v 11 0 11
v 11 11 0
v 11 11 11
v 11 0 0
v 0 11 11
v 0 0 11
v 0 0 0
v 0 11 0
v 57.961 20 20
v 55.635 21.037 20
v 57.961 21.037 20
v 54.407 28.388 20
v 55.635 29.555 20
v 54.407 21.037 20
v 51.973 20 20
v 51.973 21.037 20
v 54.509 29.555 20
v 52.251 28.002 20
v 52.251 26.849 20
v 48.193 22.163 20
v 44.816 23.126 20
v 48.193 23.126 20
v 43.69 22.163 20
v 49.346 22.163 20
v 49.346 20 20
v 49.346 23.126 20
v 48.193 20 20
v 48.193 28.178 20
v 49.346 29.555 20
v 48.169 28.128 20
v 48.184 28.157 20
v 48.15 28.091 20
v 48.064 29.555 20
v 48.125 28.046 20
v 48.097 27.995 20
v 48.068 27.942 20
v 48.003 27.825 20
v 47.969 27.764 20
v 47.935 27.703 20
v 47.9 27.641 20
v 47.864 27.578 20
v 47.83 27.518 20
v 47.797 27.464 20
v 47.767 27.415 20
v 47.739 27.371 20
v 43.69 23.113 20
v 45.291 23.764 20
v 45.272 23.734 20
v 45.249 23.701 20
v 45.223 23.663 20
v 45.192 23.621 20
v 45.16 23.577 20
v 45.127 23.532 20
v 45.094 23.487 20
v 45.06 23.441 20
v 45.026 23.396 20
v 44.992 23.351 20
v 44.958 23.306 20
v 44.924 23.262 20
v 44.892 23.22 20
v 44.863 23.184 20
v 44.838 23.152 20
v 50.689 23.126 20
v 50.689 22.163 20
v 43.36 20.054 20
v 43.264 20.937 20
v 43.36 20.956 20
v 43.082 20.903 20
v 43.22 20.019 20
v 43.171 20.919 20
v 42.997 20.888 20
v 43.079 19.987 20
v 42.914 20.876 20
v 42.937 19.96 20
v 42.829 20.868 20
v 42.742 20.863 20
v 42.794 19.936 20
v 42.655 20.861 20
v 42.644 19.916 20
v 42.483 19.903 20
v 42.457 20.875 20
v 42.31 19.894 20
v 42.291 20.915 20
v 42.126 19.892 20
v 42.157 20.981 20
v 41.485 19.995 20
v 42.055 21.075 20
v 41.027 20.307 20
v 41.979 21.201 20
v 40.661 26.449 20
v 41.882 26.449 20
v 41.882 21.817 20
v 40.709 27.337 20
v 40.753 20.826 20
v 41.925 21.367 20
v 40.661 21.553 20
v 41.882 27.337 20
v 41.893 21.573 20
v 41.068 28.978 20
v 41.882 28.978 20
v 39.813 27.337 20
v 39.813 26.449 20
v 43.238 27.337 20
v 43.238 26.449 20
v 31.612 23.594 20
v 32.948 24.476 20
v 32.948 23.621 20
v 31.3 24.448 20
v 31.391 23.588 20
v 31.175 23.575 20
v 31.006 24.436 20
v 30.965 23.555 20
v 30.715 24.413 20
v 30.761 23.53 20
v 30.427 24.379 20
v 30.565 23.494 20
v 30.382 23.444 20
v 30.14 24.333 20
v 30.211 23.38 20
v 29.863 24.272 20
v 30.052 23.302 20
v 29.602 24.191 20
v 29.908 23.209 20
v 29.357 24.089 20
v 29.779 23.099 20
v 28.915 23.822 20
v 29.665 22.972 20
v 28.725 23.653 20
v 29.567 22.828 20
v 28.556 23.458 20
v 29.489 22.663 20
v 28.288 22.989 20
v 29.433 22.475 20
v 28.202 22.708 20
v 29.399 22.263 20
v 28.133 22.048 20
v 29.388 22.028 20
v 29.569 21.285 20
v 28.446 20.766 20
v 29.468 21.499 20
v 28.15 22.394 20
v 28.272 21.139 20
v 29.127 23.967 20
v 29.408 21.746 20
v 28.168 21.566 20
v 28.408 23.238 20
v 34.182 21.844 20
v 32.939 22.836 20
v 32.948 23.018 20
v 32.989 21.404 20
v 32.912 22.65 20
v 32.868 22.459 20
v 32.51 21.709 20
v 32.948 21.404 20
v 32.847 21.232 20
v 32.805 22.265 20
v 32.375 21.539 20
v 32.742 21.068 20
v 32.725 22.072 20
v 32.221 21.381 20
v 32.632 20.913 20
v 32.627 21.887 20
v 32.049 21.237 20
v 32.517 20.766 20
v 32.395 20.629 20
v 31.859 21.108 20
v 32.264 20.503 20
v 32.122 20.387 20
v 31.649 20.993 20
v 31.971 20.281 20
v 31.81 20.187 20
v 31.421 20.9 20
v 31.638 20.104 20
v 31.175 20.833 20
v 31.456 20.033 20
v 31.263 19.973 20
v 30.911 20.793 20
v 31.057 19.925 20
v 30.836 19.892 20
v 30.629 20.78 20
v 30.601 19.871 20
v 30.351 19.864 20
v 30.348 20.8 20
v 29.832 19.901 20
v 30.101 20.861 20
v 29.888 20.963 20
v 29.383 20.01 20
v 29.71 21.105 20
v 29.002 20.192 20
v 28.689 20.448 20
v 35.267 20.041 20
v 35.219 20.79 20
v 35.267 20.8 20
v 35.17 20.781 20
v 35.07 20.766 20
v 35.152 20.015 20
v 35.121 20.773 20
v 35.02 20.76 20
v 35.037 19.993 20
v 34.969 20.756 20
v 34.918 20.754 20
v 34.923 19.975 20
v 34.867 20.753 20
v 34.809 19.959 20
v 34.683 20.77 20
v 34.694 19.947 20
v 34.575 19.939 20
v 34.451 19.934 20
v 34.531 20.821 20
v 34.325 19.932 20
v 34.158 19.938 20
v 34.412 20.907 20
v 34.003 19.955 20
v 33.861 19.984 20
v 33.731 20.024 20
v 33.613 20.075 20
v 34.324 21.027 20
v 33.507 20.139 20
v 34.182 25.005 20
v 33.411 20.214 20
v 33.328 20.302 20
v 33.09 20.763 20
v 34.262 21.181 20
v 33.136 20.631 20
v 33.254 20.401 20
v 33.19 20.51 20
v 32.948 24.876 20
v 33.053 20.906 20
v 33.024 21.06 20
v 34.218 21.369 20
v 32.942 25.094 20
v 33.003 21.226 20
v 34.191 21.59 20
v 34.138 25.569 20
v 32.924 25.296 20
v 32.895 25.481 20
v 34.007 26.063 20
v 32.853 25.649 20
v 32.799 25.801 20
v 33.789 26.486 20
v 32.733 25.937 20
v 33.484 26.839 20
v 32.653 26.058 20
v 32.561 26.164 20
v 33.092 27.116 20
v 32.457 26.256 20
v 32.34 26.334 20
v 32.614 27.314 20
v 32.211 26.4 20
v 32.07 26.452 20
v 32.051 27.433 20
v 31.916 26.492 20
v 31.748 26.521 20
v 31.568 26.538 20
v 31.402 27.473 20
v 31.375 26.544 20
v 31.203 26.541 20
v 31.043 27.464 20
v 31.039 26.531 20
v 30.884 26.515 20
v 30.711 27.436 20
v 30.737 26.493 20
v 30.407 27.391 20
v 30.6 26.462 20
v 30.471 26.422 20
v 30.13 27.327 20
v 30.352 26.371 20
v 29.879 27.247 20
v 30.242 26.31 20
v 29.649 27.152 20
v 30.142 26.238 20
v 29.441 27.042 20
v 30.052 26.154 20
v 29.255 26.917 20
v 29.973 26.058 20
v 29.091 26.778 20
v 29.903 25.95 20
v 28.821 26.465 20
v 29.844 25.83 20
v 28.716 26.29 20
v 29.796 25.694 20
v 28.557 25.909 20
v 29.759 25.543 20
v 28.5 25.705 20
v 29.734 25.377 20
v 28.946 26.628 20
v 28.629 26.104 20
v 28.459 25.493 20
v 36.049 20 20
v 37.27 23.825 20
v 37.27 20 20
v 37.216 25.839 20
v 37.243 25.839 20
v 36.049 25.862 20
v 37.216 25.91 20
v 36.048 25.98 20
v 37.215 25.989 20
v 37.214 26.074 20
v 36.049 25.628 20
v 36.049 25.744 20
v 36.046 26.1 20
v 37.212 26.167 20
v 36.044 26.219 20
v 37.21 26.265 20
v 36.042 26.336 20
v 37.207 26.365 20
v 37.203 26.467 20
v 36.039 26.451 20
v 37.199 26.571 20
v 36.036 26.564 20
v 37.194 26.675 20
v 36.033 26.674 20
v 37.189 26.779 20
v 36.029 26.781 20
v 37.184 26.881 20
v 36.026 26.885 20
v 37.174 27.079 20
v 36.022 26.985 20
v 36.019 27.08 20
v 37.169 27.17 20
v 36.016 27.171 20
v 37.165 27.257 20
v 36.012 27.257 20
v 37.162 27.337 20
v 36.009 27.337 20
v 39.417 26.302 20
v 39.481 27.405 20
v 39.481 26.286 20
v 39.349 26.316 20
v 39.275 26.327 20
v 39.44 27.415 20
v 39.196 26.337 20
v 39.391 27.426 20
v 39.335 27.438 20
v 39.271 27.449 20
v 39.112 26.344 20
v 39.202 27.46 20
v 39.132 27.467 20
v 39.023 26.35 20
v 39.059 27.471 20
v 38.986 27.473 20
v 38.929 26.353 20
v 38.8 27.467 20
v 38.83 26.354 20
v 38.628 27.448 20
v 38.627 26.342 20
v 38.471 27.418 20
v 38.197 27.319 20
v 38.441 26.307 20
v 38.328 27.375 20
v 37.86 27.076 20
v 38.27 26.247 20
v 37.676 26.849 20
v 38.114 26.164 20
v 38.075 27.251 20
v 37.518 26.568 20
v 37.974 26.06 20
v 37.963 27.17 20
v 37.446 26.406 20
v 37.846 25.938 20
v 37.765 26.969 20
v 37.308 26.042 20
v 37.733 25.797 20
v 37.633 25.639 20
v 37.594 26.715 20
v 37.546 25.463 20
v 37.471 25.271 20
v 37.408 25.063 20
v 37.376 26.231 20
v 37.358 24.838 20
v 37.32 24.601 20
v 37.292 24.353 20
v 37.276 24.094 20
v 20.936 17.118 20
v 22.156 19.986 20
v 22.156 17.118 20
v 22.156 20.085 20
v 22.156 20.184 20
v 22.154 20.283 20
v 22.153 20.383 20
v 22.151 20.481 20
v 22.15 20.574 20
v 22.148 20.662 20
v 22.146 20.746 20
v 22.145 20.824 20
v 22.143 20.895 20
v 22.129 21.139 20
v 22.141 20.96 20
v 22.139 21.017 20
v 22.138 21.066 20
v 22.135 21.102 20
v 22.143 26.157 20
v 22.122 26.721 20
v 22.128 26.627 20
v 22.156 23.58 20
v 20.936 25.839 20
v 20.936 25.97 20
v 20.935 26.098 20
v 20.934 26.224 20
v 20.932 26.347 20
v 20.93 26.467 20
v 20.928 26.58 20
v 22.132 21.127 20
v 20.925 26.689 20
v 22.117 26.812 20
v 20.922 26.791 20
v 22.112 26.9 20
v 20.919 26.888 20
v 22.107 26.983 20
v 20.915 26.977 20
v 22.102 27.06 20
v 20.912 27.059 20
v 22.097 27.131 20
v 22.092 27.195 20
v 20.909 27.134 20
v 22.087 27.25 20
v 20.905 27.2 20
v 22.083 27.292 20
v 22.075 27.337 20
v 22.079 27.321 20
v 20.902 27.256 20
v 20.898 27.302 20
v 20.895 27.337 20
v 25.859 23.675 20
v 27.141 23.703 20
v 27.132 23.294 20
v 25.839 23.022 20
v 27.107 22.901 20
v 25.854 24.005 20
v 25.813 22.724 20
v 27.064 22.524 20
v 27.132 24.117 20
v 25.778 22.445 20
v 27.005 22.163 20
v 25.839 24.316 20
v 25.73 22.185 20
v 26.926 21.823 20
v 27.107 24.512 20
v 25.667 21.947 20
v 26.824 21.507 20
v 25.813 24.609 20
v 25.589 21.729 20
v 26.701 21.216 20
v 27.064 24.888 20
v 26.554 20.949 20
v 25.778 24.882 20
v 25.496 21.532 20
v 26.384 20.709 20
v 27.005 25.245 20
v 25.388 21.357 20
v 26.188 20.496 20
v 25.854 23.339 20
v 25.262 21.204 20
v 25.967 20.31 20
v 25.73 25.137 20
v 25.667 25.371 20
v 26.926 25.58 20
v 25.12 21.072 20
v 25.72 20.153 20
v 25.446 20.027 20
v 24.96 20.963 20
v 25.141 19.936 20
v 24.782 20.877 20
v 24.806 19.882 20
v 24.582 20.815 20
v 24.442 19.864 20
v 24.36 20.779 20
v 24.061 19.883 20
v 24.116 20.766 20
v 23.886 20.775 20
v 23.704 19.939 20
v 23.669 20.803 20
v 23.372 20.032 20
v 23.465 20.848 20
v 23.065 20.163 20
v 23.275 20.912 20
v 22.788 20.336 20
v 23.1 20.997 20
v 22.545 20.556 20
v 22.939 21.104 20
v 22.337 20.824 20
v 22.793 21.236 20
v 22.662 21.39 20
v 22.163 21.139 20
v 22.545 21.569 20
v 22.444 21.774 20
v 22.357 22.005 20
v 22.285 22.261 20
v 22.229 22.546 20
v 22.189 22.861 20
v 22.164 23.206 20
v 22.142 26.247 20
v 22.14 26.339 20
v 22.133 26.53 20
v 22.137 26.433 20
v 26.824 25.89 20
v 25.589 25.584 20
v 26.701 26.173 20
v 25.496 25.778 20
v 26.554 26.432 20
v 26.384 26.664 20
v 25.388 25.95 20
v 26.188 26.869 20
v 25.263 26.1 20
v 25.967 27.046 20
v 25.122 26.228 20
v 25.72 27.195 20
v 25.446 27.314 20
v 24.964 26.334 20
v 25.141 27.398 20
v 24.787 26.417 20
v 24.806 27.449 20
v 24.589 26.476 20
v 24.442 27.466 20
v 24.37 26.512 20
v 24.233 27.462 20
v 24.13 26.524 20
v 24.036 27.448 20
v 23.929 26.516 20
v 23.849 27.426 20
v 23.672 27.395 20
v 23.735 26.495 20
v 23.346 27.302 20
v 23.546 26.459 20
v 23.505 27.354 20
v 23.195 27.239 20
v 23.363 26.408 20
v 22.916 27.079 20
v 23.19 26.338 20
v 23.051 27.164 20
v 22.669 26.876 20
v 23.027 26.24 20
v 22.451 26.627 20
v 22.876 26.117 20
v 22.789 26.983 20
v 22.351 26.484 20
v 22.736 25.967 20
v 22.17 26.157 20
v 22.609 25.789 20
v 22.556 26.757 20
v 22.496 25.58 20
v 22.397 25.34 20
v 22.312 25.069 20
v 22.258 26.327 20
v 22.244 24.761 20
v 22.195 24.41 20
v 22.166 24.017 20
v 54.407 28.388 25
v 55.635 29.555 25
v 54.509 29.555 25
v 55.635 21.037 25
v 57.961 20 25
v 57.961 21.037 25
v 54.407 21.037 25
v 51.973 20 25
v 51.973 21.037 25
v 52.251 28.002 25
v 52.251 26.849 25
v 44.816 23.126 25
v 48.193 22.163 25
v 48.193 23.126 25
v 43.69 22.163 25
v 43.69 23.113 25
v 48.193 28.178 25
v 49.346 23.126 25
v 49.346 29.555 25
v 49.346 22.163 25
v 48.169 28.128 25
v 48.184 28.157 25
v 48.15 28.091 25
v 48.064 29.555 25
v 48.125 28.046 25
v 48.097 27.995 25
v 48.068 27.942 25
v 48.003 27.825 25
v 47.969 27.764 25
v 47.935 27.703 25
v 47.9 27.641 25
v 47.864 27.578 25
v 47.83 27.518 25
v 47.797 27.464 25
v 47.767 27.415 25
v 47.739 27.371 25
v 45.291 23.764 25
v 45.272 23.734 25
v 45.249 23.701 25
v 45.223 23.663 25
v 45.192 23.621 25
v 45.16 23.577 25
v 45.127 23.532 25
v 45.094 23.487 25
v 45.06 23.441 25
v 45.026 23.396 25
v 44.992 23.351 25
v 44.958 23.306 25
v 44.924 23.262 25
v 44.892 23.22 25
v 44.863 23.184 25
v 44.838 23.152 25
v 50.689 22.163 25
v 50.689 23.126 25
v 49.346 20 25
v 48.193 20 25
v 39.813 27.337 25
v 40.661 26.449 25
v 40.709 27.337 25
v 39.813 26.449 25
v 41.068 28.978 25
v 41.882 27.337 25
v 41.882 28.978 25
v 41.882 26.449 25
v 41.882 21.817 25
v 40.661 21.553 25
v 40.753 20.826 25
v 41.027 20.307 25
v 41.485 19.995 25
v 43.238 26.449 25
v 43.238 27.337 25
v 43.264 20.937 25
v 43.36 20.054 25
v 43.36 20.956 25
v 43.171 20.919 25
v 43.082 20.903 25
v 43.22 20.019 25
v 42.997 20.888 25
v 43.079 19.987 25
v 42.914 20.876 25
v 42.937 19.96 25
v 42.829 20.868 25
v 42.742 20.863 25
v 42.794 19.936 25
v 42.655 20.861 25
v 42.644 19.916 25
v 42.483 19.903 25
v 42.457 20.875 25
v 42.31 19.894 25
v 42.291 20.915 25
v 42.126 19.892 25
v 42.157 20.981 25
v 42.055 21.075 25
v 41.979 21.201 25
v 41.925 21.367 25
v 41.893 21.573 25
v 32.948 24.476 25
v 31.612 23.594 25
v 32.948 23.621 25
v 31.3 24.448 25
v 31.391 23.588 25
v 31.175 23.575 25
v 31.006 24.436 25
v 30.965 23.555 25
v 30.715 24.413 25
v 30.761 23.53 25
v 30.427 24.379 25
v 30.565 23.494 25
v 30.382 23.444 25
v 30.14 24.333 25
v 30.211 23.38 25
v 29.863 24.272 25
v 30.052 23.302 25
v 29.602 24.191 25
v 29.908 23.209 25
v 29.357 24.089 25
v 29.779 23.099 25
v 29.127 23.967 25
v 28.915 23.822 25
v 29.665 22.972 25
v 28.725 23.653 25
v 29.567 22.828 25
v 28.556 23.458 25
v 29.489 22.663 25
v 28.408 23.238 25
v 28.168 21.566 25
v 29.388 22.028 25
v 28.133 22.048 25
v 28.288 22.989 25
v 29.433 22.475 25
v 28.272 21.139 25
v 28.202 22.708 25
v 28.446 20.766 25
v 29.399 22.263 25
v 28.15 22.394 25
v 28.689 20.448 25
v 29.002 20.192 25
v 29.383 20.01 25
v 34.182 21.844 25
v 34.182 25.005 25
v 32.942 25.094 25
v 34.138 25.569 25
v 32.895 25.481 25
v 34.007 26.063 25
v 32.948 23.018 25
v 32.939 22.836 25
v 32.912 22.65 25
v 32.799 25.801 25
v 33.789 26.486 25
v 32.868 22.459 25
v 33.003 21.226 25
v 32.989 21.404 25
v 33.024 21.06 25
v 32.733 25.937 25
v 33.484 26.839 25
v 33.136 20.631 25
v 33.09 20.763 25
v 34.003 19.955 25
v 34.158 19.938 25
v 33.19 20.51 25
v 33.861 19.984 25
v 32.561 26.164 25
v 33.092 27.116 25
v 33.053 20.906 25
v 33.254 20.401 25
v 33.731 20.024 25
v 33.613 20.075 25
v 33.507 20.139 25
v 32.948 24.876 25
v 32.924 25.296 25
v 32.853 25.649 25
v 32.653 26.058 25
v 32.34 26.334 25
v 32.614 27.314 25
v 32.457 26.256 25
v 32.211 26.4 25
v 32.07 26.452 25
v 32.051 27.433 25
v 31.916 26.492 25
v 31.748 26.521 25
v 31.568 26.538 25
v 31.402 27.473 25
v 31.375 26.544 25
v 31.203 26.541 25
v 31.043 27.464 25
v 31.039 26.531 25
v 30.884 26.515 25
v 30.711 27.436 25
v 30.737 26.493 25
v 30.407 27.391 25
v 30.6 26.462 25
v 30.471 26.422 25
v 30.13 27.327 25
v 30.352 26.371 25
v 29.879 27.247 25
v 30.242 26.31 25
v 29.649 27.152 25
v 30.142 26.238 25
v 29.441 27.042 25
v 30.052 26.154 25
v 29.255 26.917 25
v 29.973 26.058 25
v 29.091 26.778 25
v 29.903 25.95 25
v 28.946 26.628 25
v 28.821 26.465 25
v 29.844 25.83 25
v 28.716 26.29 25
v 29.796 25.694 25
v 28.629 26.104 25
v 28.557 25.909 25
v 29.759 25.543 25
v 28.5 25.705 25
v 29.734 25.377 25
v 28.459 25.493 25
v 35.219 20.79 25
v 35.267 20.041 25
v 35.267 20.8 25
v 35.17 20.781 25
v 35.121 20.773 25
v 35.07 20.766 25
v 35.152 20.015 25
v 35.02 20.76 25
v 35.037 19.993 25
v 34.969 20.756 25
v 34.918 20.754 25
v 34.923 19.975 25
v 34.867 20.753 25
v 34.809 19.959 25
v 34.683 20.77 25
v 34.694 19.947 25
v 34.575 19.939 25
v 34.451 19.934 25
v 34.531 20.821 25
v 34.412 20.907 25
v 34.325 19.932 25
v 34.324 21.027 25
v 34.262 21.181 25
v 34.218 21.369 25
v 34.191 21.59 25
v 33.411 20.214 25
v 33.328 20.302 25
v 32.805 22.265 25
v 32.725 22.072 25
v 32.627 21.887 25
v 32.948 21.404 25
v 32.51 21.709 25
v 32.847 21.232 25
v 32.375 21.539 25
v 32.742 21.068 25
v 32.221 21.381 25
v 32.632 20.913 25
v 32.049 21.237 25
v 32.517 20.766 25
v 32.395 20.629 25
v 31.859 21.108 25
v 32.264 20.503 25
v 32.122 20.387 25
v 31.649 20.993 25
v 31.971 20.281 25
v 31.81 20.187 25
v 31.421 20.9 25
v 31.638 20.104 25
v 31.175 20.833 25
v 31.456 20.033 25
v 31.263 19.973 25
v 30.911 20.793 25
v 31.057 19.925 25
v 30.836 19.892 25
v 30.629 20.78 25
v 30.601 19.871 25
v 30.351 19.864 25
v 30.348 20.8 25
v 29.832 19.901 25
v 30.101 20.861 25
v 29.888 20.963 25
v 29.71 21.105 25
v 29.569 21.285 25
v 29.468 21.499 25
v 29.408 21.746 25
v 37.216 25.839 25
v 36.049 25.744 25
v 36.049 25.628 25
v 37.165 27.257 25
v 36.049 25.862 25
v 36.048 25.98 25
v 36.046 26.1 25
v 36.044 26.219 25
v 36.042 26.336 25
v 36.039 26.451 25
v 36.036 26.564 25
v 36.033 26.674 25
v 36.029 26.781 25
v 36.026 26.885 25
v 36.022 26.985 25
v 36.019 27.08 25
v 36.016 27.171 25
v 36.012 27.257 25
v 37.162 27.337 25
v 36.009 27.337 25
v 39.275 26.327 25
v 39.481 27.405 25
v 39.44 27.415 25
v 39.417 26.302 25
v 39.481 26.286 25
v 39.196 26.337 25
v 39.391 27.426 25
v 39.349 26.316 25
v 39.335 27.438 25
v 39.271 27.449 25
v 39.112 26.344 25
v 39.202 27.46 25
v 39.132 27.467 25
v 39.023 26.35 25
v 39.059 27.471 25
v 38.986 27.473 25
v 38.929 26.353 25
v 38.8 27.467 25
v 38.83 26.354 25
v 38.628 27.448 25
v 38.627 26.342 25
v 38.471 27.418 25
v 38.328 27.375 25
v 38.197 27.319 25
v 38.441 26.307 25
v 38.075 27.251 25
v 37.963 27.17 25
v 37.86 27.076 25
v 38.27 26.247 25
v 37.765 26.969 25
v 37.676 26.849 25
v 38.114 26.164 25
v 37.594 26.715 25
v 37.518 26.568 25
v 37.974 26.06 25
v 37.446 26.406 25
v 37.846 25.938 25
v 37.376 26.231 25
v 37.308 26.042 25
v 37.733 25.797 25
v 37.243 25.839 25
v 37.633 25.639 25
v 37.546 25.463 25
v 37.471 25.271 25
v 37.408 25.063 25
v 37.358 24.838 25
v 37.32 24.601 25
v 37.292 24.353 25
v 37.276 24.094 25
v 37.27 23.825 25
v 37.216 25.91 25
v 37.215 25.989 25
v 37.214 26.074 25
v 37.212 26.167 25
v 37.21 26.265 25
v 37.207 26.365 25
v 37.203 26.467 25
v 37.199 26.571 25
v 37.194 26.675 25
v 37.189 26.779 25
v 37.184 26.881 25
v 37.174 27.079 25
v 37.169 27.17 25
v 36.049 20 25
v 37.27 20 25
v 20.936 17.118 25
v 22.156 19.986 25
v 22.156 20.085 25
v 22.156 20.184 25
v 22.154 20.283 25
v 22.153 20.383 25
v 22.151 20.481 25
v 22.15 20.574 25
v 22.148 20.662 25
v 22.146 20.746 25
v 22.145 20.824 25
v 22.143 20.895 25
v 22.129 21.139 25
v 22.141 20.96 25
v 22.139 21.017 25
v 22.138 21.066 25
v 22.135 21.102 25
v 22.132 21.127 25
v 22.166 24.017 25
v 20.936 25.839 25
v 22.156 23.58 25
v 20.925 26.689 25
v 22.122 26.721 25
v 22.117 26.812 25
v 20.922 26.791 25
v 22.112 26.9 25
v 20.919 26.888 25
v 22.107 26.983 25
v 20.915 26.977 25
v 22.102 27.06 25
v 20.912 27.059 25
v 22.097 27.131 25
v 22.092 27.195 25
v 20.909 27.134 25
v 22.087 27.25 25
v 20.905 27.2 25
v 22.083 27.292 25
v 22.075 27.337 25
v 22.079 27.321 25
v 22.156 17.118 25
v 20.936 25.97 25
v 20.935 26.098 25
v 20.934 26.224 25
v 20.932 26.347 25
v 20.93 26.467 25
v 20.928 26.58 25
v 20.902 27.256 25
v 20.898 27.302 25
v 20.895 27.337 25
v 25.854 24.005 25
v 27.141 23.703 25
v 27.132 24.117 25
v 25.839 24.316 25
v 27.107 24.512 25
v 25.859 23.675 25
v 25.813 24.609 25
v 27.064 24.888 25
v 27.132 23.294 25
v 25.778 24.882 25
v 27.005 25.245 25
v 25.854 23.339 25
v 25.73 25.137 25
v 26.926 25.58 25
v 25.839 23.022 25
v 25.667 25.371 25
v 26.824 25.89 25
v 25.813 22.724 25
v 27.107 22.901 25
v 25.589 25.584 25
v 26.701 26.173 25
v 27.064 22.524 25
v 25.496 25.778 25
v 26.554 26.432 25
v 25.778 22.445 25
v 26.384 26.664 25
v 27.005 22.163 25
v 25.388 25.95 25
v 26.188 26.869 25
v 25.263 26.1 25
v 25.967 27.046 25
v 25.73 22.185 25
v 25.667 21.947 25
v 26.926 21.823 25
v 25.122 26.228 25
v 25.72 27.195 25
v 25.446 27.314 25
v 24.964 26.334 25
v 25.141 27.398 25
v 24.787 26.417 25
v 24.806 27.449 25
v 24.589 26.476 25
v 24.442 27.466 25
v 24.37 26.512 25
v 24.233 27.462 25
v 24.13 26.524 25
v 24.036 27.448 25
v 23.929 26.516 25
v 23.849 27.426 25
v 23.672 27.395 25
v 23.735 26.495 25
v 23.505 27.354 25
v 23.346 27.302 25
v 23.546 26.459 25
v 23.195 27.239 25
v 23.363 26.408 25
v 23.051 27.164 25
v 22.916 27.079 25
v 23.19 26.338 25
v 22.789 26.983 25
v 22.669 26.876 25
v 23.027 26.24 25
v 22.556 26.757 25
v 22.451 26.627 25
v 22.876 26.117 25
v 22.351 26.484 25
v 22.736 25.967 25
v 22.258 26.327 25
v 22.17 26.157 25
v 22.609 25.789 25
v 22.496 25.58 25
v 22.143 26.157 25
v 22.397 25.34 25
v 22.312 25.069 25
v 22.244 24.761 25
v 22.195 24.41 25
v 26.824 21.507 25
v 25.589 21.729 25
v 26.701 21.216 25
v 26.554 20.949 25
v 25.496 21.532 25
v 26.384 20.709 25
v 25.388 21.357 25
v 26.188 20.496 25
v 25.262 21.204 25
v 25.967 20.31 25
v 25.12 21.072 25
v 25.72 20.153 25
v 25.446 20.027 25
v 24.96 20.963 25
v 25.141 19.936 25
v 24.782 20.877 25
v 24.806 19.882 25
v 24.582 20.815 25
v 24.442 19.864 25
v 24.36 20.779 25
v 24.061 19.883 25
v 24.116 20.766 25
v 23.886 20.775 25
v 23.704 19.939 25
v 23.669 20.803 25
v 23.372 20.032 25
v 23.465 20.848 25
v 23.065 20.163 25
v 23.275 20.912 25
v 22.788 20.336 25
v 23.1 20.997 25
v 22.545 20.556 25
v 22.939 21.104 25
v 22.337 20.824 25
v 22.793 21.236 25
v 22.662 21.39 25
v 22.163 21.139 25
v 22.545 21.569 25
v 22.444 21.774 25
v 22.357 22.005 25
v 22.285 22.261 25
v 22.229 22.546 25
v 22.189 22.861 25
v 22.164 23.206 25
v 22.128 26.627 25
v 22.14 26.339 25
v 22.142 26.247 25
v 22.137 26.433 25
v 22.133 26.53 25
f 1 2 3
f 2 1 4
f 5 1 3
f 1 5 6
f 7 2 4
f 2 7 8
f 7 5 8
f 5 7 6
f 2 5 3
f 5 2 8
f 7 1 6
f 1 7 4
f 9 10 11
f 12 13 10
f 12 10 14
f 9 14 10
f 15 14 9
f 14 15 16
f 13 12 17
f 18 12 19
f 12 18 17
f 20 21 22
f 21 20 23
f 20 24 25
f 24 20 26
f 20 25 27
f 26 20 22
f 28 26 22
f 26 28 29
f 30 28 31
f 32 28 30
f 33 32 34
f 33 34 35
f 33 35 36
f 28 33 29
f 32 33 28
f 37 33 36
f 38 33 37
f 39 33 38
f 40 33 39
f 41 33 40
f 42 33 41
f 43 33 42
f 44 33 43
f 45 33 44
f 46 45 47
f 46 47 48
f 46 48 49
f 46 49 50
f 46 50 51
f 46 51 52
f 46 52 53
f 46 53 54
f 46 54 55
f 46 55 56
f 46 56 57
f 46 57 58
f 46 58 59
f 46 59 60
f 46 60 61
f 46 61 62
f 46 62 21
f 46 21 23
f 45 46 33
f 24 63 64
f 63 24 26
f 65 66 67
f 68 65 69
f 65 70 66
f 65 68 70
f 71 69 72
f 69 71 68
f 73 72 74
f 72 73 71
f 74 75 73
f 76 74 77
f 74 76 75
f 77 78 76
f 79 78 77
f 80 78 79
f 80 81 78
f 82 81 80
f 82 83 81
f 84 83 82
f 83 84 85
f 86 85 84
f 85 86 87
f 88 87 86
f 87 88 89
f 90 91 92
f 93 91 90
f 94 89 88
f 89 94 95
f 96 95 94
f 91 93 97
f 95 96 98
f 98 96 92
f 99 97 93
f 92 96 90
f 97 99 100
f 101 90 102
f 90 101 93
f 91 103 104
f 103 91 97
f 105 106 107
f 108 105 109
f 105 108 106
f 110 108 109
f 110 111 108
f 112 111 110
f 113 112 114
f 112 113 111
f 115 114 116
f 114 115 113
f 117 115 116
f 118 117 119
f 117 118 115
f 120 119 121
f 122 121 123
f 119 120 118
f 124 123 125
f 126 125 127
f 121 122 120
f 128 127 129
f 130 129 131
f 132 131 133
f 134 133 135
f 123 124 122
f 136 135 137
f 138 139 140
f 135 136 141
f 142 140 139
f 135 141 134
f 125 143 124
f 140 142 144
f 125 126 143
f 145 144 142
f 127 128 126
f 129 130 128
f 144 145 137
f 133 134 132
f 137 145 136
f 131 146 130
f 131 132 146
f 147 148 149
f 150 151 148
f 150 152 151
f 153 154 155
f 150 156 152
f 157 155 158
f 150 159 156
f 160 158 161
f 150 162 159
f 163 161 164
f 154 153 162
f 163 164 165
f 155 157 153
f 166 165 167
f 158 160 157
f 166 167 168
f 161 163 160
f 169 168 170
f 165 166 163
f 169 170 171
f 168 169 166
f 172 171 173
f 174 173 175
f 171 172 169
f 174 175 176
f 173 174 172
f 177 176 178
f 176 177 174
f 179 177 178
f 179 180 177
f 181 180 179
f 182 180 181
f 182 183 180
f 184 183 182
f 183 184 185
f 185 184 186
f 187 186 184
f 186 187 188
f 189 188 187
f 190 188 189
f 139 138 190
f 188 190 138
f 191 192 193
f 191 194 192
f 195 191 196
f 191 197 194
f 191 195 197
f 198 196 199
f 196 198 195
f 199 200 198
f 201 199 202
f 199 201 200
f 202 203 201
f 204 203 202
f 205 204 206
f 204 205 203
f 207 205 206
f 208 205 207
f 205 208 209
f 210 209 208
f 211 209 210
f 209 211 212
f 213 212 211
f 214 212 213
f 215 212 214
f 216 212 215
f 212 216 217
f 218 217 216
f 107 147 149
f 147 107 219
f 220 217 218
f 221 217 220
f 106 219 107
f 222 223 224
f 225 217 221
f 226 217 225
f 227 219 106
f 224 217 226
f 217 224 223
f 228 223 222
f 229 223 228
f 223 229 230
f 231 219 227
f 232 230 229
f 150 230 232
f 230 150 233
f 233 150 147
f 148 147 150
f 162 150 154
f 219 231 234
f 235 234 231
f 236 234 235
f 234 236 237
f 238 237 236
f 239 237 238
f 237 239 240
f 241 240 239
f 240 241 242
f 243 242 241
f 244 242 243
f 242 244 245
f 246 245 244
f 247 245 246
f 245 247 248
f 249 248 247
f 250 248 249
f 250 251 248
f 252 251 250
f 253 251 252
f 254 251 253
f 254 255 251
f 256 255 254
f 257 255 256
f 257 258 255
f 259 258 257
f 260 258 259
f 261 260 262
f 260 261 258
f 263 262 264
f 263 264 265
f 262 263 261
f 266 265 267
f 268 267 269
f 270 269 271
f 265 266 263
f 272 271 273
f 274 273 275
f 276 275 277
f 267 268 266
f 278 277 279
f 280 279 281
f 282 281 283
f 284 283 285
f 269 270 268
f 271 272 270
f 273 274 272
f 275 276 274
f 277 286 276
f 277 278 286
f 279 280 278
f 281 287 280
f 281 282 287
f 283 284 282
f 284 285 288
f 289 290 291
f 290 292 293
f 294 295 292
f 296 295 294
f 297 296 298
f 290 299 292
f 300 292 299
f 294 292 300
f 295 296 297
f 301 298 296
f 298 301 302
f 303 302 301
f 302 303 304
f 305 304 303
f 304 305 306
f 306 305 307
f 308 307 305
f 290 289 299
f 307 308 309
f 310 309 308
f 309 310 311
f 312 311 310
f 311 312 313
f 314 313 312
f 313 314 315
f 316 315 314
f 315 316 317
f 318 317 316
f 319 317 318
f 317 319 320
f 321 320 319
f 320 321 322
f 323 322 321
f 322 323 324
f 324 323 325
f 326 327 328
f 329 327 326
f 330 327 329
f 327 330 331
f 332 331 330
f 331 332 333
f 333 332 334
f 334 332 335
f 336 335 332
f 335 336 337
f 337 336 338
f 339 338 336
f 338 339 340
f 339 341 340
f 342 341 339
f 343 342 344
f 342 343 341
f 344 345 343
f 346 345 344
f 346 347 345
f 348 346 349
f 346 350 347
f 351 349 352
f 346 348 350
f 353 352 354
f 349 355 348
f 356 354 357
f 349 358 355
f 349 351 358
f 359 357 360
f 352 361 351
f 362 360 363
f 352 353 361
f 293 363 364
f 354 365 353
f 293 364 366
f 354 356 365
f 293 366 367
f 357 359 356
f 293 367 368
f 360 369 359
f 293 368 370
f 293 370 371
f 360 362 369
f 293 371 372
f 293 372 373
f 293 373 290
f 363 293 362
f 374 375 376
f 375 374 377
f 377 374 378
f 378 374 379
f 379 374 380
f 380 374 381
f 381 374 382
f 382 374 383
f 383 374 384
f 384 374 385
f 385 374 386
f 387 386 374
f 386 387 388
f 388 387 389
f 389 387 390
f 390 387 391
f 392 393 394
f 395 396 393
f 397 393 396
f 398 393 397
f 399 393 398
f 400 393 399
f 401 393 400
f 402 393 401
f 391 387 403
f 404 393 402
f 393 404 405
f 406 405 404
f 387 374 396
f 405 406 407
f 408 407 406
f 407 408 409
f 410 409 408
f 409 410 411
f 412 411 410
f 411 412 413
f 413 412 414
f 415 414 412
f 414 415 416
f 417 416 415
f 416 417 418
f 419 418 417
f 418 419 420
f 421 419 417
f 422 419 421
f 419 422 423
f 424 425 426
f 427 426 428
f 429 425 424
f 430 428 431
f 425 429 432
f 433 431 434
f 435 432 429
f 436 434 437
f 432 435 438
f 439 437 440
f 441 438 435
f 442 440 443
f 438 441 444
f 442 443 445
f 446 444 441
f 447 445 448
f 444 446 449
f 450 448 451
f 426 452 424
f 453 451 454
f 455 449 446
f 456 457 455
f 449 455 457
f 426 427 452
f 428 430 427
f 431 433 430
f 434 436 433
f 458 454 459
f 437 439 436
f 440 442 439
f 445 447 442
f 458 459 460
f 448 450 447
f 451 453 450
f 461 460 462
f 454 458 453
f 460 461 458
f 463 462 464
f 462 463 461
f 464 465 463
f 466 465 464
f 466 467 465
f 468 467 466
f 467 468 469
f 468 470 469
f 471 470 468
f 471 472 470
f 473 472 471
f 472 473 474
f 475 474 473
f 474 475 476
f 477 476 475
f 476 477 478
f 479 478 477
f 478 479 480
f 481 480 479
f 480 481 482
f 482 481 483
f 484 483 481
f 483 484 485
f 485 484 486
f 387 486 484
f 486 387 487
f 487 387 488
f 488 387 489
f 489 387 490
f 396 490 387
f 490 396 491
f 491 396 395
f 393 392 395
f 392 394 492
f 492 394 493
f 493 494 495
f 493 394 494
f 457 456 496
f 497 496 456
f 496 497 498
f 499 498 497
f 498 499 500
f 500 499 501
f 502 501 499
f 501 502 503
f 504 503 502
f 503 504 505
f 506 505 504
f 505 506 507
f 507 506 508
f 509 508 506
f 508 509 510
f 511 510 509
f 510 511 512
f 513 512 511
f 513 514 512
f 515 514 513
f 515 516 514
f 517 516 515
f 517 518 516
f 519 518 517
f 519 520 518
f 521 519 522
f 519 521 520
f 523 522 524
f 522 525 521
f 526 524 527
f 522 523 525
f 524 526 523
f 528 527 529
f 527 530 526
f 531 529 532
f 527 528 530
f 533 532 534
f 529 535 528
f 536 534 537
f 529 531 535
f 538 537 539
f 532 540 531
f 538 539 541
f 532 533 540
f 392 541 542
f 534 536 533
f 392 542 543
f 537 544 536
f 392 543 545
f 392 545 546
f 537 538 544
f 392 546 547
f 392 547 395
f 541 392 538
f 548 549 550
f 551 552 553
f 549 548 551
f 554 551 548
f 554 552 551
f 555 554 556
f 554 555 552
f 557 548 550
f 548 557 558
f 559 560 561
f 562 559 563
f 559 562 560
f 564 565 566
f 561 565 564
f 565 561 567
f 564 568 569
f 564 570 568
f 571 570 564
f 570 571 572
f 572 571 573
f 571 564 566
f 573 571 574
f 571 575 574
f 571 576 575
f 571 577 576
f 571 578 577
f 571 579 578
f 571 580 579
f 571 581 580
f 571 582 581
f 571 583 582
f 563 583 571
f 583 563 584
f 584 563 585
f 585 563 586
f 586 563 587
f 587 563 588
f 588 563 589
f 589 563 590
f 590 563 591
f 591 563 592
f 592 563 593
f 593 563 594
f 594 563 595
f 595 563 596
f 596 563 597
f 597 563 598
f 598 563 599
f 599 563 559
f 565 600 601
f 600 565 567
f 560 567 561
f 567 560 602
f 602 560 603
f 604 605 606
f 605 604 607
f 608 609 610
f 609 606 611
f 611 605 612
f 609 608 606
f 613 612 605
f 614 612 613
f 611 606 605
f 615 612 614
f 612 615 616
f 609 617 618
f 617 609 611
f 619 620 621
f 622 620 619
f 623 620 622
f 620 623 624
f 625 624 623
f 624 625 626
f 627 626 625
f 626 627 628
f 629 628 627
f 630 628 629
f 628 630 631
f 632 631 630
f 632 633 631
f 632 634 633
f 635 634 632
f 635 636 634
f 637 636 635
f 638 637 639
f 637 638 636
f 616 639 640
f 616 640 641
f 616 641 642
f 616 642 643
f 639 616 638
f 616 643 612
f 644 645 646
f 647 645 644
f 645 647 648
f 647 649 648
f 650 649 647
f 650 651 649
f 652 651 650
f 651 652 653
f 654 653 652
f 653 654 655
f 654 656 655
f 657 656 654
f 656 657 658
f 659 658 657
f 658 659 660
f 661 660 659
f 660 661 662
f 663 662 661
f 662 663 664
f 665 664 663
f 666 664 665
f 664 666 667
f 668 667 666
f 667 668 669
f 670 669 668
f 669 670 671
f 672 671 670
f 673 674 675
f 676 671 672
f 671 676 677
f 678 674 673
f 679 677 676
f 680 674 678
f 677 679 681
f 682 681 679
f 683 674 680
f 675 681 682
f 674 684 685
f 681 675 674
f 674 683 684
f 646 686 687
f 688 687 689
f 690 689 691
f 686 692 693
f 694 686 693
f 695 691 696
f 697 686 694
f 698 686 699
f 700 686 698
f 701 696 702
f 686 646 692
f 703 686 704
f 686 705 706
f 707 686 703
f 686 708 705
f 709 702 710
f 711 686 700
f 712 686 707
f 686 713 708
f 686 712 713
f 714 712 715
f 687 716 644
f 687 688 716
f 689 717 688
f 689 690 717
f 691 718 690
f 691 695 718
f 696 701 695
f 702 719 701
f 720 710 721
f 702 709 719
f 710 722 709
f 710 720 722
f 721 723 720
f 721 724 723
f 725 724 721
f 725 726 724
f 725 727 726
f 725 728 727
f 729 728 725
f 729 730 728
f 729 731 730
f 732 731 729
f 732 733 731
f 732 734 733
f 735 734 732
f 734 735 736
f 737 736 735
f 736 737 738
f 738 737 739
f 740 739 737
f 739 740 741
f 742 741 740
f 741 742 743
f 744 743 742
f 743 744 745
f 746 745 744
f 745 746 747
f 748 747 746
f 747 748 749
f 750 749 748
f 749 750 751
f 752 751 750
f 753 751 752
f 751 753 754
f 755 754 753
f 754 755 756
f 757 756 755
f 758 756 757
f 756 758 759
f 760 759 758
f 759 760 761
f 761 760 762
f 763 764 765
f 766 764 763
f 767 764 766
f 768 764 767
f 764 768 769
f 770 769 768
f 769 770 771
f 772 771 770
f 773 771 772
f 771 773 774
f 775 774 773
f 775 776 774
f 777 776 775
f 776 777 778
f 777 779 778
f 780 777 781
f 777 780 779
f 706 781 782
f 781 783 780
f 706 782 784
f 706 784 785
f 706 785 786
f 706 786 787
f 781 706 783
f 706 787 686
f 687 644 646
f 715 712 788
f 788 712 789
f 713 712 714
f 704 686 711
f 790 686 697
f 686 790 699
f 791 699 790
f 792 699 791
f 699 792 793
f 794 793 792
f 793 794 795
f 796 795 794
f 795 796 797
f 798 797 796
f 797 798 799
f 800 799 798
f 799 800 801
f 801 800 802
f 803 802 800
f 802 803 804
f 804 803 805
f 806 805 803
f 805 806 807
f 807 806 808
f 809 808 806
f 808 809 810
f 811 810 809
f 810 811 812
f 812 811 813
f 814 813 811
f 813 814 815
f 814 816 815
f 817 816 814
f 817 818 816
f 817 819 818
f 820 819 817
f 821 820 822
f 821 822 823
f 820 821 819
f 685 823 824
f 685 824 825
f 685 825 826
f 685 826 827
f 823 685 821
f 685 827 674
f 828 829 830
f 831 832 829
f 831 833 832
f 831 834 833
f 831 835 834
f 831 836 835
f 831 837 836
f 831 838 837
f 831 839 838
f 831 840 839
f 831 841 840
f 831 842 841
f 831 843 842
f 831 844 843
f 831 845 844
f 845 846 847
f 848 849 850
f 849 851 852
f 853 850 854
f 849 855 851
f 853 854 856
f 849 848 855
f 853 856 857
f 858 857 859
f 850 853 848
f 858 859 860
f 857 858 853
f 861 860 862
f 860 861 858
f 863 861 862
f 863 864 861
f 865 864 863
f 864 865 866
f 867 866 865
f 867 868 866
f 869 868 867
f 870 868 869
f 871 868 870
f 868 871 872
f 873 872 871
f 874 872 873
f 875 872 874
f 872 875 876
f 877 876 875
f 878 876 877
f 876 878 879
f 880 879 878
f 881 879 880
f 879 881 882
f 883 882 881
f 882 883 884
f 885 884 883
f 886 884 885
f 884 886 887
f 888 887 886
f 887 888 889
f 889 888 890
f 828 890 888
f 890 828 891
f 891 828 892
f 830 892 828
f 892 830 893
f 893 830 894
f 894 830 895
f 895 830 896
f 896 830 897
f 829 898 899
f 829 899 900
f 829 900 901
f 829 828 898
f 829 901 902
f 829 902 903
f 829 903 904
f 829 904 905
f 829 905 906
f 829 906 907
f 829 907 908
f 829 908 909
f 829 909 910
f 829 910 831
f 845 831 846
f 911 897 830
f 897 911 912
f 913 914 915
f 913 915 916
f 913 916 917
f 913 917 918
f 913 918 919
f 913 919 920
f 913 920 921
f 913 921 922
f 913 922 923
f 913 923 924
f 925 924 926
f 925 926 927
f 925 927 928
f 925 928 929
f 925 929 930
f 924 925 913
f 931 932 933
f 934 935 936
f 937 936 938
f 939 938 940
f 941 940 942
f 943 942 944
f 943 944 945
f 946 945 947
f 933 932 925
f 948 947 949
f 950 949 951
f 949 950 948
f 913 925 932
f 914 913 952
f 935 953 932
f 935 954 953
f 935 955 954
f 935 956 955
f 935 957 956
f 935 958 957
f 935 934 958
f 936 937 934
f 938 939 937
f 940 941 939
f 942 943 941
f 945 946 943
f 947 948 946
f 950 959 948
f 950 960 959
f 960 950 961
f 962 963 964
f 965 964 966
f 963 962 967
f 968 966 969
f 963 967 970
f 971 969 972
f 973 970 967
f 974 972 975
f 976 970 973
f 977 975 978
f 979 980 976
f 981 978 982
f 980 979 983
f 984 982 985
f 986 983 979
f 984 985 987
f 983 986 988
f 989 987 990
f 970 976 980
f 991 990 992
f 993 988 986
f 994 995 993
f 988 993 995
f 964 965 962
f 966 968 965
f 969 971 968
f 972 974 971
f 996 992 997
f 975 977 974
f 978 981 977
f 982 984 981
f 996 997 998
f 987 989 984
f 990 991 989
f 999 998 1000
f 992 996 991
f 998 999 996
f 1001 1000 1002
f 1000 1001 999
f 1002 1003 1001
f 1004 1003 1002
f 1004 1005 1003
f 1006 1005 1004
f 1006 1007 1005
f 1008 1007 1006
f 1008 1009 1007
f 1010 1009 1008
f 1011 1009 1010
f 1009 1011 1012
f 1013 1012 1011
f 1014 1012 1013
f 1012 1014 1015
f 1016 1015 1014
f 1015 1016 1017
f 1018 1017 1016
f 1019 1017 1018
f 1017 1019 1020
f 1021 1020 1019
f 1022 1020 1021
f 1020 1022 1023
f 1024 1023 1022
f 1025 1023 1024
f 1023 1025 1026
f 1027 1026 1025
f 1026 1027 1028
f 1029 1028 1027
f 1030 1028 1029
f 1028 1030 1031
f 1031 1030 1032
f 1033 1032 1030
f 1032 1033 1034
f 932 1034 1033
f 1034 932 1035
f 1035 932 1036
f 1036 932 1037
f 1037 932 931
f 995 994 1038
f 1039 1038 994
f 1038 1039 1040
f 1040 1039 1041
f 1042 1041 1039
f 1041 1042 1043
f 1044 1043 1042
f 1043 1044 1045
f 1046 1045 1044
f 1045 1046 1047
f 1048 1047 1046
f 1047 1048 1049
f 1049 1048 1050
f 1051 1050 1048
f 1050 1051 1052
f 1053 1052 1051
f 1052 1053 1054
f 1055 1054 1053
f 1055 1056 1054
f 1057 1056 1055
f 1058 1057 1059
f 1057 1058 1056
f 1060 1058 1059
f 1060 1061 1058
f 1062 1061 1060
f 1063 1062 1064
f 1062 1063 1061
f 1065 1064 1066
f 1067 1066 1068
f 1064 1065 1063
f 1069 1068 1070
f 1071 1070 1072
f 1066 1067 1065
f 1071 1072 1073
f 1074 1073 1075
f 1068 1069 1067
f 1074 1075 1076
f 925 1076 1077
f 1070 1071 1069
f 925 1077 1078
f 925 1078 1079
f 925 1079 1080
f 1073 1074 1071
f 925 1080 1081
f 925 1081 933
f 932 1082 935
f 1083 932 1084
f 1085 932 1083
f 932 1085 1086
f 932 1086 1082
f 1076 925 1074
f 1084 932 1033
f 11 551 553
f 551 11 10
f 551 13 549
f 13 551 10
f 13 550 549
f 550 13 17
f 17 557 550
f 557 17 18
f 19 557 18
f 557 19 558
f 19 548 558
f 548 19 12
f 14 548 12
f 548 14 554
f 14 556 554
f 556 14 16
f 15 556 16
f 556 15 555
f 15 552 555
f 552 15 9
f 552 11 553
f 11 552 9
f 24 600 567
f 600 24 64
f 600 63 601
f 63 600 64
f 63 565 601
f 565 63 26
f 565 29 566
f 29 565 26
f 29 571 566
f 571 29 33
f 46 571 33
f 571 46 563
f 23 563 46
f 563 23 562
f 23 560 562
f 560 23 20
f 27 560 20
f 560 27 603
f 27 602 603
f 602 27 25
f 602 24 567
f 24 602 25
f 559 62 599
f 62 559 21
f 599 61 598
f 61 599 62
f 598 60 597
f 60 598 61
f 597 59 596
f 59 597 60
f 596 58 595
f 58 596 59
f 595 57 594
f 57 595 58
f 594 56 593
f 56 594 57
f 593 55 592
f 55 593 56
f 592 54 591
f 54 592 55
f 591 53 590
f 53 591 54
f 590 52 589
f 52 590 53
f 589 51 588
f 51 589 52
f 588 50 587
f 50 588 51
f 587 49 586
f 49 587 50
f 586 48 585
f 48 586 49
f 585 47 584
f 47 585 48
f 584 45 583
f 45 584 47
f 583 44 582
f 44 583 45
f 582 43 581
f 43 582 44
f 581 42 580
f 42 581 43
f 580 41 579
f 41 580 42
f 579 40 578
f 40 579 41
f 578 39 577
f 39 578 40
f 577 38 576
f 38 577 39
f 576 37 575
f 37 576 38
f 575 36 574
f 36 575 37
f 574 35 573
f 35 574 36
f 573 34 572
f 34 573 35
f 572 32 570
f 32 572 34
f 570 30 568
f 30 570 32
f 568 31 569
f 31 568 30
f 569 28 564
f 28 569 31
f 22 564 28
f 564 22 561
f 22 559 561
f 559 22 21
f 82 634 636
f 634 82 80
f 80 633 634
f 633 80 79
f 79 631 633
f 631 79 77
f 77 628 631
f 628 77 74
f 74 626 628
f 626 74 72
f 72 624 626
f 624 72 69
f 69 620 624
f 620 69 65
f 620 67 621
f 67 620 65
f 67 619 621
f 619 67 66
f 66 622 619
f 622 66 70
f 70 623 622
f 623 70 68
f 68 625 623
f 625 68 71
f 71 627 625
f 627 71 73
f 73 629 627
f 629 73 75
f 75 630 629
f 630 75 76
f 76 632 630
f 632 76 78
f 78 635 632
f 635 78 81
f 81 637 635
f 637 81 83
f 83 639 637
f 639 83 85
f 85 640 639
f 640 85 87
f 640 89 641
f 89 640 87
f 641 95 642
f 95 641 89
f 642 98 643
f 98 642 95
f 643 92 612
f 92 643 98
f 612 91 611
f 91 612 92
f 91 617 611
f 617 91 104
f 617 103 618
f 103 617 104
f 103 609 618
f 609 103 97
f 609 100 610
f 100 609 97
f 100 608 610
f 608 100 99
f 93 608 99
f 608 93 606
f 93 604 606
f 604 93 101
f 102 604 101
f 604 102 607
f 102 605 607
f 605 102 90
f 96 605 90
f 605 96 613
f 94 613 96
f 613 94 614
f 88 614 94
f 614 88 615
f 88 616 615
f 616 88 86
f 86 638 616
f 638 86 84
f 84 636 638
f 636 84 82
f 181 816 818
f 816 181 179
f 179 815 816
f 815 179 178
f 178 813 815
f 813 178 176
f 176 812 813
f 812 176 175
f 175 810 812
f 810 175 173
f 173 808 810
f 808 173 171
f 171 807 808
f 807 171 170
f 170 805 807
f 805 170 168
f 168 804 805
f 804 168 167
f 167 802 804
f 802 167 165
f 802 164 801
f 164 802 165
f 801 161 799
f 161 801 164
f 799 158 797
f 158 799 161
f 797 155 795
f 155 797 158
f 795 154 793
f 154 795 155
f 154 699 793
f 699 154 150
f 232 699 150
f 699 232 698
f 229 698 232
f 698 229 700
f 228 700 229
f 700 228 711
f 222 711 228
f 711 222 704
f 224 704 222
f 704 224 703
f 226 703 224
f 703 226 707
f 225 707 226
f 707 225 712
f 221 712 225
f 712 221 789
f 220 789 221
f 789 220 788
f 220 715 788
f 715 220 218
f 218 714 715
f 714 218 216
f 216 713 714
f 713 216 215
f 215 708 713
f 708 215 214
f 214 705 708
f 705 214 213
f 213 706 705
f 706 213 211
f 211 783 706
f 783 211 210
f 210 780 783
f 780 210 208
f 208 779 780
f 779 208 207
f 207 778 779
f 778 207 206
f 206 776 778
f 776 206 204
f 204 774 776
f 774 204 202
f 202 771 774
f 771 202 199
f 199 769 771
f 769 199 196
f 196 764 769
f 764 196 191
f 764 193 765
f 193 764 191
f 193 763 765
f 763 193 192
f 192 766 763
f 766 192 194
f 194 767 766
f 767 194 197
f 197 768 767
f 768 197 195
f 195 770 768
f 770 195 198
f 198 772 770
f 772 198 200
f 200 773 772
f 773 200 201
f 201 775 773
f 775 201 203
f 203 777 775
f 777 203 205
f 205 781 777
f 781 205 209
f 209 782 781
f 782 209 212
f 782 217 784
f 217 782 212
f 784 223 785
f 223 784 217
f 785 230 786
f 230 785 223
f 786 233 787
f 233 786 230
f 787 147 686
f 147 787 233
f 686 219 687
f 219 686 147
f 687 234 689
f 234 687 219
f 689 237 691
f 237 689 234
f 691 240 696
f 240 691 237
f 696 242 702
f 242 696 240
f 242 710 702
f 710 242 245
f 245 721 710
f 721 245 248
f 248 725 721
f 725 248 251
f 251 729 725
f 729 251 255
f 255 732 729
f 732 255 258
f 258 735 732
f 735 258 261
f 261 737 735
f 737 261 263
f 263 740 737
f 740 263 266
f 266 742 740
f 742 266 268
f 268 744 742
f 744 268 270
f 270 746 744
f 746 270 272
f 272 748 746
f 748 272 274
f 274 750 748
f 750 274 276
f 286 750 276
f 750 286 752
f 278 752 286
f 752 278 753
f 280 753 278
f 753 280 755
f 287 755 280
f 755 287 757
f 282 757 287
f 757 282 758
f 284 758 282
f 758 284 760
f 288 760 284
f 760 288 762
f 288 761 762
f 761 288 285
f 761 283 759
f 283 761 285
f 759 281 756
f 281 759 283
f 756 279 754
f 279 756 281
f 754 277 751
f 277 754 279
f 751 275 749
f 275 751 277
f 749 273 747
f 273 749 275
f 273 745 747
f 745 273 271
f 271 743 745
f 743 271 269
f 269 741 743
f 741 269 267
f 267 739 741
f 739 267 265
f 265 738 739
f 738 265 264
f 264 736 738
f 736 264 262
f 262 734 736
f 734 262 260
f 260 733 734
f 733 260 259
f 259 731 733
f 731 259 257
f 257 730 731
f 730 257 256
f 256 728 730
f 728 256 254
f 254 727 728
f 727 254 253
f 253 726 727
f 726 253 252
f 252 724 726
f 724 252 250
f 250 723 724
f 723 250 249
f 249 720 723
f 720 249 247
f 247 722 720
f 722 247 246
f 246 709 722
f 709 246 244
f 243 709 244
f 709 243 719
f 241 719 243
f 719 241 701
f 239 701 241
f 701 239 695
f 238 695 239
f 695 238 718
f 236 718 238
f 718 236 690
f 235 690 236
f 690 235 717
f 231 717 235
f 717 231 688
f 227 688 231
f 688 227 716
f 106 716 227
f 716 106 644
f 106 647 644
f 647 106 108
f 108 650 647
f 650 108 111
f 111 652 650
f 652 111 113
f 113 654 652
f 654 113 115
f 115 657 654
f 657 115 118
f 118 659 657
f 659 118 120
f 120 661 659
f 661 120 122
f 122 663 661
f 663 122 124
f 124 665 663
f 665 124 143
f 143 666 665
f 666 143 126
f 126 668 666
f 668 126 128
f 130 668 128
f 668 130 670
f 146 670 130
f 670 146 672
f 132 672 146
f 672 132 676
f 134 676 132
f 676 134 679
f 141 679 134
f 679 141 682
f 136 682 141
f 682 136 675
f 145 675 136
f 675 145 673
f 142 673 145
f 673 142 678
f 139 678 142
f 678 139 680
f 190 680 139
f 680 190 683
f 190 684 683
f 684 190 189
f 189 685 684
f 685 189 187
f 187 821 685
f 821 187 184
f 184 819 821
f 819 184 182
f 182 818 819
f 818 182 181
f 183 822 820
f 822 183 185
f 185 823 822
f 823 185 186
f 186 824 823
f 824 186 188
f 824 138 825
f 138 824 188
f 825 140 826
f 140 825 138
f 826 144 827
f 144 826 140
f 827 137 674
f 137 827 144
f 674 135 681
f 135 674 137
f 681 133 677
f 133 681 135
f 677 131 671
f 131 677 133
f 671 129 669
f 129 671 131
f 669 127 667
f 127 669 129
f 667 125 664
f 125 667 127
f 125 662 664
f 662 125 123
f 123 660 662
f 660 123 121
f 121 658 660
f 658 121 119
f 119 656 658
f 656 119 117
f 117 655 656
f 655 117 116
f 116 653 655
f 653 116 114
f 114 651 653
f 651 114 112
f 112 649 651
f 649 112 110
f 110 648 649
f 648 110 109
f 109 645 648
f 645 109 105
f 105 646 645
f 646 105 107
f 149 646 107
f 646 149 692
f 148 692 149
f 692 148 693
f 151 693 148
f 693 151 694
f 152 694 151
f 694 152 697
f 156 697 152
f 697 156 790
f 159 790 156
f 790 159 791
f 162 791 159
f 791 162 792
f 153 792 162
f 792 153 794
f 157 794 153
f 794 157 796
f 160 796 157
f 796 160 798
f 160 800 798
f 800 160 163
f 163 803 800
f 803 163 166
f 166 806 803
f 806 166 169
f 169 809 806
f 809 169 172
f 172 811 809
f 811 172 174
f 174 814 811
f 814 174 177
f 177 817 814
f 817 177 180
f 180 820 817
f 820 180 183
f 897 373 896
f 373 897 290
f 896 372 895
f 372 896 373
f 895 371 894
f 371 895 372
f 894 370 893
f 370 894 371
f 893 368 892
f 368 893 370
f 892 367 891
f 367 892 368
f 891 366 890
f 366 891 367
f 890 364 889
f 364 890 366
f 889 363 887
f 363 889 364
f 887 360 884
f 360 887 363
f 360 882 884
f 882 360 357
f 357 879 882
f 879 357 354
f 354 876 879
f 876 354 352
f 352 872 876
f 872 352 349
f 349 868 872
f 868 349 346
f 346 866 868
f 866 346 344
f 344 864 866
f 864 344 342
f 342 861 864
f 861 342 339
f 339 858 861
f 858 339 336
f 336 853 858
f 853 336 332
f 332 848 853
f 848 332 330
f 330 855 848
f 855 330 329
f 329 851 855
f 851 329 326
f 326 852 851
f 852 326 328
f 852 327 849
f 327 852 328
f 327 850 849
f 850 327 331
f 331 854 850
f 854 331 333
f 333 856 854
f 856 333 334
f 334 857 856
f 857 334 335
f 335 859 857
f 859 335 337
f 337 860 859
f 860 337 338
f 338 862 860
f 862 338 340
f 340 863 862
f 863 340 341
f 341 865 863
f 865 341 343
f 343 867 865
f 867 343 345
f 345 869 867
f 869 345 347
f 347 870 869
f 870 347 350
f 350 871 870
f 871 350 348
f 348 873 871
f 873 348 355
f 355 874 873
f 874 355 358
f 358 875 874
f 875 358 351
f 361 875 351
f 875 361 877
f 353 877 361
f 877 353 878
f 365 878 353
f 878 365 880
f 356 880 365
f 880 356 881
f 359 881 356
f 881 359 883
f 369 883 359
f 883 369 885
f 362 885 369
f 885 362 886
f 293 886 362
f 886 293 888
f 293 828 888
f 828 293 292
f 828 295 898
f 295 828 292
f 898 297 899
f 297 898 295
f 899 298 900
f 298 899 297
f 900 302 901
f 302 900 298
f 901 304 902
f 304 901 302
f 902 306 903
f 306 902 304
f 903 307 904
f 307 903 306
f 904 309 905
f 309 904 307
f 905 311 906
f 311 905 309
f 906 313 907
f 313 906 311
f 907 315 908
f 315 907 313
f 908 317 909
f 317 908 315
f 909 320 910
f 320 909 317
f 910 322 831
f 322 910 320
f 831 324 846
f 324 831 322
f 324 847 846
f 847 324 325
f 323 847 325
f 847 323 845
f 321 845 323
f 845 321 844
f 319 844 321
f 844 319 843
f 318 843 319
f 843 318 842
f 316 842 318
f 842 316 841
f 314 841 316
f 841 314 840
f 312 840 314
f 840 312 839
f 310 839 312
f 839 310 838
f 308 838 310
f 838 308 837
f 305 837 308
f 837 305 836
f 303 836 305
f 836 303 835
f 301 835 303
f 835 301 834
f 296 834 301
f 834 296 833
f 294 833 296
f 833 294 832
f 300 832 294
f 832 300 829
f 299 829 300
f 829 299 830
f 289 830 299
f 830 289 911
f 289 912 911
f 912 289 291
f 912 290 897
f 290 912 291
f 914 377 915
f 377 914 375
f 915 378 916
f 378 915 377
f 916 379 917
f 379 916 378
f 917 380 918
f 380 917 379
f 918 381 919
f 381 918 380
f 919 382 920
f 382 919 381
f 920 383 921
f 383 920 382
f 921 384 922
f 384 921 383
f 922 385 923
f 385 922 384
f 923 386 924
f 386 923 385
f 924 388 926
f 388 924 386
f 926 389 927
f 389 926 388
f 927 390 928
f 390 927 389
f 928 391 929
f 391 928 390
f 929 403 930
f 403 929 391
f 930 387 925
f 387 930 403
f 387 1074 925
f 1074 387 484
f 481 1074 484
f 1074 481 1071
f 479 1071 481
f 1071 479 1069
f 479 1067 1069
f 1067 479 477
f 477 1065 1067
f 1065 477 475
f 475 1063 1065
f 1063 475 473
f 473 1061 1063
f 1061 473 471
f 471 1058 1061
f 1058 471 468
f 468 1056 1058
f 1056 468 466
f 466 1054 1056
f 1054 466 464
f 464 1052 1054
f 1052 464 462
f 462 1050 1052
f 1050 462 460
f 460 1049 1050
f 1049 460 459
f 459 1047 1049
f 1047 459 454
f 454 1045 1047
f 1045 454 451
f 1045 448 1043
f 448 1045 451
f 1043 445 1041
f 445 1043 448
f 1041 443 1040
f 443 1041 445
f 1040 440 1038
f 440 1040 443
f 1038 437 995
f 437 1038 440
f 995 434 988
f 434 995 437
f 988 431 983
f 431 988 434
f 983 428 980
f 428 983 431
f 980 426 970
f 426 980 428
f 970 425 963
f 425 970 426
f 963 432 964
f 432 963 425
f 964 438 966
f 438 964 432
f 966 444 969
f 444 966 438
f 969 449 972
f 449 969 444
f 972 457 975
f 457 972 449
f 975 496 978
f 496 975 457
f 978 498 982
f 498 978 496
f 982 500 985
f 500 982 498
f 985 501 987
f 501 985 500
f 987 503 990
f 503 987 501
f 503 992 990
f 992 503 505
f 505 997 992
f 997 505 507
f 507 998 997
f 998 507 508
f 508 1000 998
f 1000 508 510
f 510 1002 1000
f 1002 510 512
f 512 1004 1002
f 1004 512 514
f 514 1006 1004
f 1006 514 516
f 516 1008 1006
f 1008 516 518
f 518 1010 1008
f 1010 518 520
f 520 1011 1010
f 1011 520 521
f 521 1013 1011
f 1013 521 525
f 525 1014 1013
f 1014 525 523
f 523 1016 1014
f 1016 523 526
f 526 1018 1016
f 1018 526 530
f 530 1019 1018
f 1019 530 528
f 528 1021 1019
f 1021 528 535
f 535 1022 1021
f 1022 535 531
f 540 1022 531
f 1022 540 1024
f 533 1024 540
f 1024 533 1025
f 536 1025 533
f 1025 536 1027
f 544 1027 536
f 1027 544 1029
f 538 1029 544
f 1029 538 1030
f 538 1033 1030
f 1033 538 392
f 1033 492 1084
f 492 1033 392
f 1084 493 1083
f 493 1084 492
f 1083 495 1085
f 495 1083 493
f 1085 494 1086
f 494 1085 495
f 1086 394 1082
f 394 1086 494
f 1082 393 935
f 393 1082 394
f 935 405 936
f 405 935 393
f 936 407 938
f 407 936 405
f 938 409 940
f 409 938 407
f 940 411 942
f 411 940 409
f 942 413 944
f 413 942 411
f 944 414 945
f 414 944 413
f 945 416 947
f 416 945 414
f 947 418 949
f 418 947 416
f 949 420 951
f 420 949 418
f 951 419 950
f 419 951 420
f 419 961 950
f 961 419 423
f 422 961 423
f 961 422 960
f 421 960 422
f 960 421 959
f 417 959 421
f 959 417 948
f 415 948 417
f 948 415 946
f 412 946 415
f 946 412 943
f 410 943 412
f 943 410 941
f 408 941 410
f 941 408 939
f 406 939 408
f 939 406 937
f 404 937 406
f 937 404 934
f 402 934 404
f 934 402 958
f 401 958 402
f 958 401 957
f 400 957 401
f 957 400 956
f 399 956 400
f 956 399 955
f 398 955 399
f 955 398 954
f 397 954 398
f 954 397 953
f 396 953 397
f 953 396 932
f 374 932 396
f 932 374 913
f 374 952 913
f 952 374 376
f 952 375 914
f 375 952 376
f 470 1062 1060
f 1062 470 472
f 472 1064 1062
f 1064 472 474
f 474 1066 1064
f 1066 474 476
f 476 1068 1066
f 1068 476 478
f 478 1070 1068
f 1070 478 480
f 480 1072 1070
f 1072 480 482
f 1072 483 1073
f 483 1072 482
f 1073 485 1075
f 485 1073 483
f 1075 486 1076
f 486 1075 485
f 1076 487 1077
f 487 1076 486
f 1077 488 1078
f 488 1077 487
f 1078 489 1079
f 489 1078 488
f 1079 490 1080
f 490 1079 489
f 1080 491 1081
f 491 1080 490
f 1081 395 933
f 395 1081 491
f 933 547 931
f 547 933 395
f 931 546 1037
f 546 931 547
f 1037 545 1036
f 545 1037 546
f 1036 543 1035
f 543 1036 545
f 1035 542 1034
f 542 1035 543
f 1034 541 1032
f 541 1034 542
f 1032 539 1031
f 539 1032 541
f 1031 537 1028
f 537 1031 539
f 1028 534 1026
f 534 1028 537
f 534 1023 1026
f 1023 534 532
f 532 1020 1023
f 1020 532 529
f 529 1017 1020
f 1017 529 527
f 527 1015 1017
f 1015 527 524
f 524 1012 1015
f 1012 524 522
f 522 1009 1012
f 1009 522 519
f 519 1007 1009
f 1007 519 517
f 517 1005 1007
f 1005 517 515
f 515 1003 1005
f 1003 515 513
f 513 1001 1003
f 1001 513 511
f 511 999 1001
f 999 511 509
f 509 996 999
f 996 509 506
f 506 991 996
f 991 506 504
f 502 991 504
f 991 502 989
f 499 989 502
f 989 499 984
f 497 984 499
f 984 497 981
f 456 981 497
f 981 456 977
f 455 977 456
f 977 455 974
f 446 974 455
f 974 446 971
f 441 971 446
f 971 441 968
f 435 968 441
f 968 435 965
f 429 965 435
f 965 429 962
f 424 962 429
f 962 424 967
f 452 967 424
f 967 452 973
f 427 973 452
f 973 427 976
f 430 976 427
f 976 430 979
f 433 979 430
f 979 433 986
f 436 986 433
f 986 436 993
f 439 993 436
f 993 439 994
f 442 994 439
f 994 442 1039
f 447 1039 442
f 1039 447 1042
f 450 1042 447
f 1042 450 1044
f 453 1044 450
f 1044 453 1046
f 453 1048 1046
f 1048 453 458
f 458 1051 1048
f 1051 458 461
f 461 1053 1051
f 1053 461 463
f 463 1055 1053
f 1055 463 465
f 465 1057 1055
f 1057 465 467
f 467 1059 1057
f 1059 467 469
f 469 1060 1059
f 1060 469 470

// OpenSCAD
//[CUSTOMIZATION]
// X Dimension
xdim=11;
// Y Dimension
ydim=17;
// Z Dimension
zdim=6;
// Message
txt="part41";
module __END_CUSTOMIZATIONS () {}
cube(xdim,ydim,zdim);
translate([20,20,20]) { linear_extrude(5) text(txt, font="Liberation Sans"); }
